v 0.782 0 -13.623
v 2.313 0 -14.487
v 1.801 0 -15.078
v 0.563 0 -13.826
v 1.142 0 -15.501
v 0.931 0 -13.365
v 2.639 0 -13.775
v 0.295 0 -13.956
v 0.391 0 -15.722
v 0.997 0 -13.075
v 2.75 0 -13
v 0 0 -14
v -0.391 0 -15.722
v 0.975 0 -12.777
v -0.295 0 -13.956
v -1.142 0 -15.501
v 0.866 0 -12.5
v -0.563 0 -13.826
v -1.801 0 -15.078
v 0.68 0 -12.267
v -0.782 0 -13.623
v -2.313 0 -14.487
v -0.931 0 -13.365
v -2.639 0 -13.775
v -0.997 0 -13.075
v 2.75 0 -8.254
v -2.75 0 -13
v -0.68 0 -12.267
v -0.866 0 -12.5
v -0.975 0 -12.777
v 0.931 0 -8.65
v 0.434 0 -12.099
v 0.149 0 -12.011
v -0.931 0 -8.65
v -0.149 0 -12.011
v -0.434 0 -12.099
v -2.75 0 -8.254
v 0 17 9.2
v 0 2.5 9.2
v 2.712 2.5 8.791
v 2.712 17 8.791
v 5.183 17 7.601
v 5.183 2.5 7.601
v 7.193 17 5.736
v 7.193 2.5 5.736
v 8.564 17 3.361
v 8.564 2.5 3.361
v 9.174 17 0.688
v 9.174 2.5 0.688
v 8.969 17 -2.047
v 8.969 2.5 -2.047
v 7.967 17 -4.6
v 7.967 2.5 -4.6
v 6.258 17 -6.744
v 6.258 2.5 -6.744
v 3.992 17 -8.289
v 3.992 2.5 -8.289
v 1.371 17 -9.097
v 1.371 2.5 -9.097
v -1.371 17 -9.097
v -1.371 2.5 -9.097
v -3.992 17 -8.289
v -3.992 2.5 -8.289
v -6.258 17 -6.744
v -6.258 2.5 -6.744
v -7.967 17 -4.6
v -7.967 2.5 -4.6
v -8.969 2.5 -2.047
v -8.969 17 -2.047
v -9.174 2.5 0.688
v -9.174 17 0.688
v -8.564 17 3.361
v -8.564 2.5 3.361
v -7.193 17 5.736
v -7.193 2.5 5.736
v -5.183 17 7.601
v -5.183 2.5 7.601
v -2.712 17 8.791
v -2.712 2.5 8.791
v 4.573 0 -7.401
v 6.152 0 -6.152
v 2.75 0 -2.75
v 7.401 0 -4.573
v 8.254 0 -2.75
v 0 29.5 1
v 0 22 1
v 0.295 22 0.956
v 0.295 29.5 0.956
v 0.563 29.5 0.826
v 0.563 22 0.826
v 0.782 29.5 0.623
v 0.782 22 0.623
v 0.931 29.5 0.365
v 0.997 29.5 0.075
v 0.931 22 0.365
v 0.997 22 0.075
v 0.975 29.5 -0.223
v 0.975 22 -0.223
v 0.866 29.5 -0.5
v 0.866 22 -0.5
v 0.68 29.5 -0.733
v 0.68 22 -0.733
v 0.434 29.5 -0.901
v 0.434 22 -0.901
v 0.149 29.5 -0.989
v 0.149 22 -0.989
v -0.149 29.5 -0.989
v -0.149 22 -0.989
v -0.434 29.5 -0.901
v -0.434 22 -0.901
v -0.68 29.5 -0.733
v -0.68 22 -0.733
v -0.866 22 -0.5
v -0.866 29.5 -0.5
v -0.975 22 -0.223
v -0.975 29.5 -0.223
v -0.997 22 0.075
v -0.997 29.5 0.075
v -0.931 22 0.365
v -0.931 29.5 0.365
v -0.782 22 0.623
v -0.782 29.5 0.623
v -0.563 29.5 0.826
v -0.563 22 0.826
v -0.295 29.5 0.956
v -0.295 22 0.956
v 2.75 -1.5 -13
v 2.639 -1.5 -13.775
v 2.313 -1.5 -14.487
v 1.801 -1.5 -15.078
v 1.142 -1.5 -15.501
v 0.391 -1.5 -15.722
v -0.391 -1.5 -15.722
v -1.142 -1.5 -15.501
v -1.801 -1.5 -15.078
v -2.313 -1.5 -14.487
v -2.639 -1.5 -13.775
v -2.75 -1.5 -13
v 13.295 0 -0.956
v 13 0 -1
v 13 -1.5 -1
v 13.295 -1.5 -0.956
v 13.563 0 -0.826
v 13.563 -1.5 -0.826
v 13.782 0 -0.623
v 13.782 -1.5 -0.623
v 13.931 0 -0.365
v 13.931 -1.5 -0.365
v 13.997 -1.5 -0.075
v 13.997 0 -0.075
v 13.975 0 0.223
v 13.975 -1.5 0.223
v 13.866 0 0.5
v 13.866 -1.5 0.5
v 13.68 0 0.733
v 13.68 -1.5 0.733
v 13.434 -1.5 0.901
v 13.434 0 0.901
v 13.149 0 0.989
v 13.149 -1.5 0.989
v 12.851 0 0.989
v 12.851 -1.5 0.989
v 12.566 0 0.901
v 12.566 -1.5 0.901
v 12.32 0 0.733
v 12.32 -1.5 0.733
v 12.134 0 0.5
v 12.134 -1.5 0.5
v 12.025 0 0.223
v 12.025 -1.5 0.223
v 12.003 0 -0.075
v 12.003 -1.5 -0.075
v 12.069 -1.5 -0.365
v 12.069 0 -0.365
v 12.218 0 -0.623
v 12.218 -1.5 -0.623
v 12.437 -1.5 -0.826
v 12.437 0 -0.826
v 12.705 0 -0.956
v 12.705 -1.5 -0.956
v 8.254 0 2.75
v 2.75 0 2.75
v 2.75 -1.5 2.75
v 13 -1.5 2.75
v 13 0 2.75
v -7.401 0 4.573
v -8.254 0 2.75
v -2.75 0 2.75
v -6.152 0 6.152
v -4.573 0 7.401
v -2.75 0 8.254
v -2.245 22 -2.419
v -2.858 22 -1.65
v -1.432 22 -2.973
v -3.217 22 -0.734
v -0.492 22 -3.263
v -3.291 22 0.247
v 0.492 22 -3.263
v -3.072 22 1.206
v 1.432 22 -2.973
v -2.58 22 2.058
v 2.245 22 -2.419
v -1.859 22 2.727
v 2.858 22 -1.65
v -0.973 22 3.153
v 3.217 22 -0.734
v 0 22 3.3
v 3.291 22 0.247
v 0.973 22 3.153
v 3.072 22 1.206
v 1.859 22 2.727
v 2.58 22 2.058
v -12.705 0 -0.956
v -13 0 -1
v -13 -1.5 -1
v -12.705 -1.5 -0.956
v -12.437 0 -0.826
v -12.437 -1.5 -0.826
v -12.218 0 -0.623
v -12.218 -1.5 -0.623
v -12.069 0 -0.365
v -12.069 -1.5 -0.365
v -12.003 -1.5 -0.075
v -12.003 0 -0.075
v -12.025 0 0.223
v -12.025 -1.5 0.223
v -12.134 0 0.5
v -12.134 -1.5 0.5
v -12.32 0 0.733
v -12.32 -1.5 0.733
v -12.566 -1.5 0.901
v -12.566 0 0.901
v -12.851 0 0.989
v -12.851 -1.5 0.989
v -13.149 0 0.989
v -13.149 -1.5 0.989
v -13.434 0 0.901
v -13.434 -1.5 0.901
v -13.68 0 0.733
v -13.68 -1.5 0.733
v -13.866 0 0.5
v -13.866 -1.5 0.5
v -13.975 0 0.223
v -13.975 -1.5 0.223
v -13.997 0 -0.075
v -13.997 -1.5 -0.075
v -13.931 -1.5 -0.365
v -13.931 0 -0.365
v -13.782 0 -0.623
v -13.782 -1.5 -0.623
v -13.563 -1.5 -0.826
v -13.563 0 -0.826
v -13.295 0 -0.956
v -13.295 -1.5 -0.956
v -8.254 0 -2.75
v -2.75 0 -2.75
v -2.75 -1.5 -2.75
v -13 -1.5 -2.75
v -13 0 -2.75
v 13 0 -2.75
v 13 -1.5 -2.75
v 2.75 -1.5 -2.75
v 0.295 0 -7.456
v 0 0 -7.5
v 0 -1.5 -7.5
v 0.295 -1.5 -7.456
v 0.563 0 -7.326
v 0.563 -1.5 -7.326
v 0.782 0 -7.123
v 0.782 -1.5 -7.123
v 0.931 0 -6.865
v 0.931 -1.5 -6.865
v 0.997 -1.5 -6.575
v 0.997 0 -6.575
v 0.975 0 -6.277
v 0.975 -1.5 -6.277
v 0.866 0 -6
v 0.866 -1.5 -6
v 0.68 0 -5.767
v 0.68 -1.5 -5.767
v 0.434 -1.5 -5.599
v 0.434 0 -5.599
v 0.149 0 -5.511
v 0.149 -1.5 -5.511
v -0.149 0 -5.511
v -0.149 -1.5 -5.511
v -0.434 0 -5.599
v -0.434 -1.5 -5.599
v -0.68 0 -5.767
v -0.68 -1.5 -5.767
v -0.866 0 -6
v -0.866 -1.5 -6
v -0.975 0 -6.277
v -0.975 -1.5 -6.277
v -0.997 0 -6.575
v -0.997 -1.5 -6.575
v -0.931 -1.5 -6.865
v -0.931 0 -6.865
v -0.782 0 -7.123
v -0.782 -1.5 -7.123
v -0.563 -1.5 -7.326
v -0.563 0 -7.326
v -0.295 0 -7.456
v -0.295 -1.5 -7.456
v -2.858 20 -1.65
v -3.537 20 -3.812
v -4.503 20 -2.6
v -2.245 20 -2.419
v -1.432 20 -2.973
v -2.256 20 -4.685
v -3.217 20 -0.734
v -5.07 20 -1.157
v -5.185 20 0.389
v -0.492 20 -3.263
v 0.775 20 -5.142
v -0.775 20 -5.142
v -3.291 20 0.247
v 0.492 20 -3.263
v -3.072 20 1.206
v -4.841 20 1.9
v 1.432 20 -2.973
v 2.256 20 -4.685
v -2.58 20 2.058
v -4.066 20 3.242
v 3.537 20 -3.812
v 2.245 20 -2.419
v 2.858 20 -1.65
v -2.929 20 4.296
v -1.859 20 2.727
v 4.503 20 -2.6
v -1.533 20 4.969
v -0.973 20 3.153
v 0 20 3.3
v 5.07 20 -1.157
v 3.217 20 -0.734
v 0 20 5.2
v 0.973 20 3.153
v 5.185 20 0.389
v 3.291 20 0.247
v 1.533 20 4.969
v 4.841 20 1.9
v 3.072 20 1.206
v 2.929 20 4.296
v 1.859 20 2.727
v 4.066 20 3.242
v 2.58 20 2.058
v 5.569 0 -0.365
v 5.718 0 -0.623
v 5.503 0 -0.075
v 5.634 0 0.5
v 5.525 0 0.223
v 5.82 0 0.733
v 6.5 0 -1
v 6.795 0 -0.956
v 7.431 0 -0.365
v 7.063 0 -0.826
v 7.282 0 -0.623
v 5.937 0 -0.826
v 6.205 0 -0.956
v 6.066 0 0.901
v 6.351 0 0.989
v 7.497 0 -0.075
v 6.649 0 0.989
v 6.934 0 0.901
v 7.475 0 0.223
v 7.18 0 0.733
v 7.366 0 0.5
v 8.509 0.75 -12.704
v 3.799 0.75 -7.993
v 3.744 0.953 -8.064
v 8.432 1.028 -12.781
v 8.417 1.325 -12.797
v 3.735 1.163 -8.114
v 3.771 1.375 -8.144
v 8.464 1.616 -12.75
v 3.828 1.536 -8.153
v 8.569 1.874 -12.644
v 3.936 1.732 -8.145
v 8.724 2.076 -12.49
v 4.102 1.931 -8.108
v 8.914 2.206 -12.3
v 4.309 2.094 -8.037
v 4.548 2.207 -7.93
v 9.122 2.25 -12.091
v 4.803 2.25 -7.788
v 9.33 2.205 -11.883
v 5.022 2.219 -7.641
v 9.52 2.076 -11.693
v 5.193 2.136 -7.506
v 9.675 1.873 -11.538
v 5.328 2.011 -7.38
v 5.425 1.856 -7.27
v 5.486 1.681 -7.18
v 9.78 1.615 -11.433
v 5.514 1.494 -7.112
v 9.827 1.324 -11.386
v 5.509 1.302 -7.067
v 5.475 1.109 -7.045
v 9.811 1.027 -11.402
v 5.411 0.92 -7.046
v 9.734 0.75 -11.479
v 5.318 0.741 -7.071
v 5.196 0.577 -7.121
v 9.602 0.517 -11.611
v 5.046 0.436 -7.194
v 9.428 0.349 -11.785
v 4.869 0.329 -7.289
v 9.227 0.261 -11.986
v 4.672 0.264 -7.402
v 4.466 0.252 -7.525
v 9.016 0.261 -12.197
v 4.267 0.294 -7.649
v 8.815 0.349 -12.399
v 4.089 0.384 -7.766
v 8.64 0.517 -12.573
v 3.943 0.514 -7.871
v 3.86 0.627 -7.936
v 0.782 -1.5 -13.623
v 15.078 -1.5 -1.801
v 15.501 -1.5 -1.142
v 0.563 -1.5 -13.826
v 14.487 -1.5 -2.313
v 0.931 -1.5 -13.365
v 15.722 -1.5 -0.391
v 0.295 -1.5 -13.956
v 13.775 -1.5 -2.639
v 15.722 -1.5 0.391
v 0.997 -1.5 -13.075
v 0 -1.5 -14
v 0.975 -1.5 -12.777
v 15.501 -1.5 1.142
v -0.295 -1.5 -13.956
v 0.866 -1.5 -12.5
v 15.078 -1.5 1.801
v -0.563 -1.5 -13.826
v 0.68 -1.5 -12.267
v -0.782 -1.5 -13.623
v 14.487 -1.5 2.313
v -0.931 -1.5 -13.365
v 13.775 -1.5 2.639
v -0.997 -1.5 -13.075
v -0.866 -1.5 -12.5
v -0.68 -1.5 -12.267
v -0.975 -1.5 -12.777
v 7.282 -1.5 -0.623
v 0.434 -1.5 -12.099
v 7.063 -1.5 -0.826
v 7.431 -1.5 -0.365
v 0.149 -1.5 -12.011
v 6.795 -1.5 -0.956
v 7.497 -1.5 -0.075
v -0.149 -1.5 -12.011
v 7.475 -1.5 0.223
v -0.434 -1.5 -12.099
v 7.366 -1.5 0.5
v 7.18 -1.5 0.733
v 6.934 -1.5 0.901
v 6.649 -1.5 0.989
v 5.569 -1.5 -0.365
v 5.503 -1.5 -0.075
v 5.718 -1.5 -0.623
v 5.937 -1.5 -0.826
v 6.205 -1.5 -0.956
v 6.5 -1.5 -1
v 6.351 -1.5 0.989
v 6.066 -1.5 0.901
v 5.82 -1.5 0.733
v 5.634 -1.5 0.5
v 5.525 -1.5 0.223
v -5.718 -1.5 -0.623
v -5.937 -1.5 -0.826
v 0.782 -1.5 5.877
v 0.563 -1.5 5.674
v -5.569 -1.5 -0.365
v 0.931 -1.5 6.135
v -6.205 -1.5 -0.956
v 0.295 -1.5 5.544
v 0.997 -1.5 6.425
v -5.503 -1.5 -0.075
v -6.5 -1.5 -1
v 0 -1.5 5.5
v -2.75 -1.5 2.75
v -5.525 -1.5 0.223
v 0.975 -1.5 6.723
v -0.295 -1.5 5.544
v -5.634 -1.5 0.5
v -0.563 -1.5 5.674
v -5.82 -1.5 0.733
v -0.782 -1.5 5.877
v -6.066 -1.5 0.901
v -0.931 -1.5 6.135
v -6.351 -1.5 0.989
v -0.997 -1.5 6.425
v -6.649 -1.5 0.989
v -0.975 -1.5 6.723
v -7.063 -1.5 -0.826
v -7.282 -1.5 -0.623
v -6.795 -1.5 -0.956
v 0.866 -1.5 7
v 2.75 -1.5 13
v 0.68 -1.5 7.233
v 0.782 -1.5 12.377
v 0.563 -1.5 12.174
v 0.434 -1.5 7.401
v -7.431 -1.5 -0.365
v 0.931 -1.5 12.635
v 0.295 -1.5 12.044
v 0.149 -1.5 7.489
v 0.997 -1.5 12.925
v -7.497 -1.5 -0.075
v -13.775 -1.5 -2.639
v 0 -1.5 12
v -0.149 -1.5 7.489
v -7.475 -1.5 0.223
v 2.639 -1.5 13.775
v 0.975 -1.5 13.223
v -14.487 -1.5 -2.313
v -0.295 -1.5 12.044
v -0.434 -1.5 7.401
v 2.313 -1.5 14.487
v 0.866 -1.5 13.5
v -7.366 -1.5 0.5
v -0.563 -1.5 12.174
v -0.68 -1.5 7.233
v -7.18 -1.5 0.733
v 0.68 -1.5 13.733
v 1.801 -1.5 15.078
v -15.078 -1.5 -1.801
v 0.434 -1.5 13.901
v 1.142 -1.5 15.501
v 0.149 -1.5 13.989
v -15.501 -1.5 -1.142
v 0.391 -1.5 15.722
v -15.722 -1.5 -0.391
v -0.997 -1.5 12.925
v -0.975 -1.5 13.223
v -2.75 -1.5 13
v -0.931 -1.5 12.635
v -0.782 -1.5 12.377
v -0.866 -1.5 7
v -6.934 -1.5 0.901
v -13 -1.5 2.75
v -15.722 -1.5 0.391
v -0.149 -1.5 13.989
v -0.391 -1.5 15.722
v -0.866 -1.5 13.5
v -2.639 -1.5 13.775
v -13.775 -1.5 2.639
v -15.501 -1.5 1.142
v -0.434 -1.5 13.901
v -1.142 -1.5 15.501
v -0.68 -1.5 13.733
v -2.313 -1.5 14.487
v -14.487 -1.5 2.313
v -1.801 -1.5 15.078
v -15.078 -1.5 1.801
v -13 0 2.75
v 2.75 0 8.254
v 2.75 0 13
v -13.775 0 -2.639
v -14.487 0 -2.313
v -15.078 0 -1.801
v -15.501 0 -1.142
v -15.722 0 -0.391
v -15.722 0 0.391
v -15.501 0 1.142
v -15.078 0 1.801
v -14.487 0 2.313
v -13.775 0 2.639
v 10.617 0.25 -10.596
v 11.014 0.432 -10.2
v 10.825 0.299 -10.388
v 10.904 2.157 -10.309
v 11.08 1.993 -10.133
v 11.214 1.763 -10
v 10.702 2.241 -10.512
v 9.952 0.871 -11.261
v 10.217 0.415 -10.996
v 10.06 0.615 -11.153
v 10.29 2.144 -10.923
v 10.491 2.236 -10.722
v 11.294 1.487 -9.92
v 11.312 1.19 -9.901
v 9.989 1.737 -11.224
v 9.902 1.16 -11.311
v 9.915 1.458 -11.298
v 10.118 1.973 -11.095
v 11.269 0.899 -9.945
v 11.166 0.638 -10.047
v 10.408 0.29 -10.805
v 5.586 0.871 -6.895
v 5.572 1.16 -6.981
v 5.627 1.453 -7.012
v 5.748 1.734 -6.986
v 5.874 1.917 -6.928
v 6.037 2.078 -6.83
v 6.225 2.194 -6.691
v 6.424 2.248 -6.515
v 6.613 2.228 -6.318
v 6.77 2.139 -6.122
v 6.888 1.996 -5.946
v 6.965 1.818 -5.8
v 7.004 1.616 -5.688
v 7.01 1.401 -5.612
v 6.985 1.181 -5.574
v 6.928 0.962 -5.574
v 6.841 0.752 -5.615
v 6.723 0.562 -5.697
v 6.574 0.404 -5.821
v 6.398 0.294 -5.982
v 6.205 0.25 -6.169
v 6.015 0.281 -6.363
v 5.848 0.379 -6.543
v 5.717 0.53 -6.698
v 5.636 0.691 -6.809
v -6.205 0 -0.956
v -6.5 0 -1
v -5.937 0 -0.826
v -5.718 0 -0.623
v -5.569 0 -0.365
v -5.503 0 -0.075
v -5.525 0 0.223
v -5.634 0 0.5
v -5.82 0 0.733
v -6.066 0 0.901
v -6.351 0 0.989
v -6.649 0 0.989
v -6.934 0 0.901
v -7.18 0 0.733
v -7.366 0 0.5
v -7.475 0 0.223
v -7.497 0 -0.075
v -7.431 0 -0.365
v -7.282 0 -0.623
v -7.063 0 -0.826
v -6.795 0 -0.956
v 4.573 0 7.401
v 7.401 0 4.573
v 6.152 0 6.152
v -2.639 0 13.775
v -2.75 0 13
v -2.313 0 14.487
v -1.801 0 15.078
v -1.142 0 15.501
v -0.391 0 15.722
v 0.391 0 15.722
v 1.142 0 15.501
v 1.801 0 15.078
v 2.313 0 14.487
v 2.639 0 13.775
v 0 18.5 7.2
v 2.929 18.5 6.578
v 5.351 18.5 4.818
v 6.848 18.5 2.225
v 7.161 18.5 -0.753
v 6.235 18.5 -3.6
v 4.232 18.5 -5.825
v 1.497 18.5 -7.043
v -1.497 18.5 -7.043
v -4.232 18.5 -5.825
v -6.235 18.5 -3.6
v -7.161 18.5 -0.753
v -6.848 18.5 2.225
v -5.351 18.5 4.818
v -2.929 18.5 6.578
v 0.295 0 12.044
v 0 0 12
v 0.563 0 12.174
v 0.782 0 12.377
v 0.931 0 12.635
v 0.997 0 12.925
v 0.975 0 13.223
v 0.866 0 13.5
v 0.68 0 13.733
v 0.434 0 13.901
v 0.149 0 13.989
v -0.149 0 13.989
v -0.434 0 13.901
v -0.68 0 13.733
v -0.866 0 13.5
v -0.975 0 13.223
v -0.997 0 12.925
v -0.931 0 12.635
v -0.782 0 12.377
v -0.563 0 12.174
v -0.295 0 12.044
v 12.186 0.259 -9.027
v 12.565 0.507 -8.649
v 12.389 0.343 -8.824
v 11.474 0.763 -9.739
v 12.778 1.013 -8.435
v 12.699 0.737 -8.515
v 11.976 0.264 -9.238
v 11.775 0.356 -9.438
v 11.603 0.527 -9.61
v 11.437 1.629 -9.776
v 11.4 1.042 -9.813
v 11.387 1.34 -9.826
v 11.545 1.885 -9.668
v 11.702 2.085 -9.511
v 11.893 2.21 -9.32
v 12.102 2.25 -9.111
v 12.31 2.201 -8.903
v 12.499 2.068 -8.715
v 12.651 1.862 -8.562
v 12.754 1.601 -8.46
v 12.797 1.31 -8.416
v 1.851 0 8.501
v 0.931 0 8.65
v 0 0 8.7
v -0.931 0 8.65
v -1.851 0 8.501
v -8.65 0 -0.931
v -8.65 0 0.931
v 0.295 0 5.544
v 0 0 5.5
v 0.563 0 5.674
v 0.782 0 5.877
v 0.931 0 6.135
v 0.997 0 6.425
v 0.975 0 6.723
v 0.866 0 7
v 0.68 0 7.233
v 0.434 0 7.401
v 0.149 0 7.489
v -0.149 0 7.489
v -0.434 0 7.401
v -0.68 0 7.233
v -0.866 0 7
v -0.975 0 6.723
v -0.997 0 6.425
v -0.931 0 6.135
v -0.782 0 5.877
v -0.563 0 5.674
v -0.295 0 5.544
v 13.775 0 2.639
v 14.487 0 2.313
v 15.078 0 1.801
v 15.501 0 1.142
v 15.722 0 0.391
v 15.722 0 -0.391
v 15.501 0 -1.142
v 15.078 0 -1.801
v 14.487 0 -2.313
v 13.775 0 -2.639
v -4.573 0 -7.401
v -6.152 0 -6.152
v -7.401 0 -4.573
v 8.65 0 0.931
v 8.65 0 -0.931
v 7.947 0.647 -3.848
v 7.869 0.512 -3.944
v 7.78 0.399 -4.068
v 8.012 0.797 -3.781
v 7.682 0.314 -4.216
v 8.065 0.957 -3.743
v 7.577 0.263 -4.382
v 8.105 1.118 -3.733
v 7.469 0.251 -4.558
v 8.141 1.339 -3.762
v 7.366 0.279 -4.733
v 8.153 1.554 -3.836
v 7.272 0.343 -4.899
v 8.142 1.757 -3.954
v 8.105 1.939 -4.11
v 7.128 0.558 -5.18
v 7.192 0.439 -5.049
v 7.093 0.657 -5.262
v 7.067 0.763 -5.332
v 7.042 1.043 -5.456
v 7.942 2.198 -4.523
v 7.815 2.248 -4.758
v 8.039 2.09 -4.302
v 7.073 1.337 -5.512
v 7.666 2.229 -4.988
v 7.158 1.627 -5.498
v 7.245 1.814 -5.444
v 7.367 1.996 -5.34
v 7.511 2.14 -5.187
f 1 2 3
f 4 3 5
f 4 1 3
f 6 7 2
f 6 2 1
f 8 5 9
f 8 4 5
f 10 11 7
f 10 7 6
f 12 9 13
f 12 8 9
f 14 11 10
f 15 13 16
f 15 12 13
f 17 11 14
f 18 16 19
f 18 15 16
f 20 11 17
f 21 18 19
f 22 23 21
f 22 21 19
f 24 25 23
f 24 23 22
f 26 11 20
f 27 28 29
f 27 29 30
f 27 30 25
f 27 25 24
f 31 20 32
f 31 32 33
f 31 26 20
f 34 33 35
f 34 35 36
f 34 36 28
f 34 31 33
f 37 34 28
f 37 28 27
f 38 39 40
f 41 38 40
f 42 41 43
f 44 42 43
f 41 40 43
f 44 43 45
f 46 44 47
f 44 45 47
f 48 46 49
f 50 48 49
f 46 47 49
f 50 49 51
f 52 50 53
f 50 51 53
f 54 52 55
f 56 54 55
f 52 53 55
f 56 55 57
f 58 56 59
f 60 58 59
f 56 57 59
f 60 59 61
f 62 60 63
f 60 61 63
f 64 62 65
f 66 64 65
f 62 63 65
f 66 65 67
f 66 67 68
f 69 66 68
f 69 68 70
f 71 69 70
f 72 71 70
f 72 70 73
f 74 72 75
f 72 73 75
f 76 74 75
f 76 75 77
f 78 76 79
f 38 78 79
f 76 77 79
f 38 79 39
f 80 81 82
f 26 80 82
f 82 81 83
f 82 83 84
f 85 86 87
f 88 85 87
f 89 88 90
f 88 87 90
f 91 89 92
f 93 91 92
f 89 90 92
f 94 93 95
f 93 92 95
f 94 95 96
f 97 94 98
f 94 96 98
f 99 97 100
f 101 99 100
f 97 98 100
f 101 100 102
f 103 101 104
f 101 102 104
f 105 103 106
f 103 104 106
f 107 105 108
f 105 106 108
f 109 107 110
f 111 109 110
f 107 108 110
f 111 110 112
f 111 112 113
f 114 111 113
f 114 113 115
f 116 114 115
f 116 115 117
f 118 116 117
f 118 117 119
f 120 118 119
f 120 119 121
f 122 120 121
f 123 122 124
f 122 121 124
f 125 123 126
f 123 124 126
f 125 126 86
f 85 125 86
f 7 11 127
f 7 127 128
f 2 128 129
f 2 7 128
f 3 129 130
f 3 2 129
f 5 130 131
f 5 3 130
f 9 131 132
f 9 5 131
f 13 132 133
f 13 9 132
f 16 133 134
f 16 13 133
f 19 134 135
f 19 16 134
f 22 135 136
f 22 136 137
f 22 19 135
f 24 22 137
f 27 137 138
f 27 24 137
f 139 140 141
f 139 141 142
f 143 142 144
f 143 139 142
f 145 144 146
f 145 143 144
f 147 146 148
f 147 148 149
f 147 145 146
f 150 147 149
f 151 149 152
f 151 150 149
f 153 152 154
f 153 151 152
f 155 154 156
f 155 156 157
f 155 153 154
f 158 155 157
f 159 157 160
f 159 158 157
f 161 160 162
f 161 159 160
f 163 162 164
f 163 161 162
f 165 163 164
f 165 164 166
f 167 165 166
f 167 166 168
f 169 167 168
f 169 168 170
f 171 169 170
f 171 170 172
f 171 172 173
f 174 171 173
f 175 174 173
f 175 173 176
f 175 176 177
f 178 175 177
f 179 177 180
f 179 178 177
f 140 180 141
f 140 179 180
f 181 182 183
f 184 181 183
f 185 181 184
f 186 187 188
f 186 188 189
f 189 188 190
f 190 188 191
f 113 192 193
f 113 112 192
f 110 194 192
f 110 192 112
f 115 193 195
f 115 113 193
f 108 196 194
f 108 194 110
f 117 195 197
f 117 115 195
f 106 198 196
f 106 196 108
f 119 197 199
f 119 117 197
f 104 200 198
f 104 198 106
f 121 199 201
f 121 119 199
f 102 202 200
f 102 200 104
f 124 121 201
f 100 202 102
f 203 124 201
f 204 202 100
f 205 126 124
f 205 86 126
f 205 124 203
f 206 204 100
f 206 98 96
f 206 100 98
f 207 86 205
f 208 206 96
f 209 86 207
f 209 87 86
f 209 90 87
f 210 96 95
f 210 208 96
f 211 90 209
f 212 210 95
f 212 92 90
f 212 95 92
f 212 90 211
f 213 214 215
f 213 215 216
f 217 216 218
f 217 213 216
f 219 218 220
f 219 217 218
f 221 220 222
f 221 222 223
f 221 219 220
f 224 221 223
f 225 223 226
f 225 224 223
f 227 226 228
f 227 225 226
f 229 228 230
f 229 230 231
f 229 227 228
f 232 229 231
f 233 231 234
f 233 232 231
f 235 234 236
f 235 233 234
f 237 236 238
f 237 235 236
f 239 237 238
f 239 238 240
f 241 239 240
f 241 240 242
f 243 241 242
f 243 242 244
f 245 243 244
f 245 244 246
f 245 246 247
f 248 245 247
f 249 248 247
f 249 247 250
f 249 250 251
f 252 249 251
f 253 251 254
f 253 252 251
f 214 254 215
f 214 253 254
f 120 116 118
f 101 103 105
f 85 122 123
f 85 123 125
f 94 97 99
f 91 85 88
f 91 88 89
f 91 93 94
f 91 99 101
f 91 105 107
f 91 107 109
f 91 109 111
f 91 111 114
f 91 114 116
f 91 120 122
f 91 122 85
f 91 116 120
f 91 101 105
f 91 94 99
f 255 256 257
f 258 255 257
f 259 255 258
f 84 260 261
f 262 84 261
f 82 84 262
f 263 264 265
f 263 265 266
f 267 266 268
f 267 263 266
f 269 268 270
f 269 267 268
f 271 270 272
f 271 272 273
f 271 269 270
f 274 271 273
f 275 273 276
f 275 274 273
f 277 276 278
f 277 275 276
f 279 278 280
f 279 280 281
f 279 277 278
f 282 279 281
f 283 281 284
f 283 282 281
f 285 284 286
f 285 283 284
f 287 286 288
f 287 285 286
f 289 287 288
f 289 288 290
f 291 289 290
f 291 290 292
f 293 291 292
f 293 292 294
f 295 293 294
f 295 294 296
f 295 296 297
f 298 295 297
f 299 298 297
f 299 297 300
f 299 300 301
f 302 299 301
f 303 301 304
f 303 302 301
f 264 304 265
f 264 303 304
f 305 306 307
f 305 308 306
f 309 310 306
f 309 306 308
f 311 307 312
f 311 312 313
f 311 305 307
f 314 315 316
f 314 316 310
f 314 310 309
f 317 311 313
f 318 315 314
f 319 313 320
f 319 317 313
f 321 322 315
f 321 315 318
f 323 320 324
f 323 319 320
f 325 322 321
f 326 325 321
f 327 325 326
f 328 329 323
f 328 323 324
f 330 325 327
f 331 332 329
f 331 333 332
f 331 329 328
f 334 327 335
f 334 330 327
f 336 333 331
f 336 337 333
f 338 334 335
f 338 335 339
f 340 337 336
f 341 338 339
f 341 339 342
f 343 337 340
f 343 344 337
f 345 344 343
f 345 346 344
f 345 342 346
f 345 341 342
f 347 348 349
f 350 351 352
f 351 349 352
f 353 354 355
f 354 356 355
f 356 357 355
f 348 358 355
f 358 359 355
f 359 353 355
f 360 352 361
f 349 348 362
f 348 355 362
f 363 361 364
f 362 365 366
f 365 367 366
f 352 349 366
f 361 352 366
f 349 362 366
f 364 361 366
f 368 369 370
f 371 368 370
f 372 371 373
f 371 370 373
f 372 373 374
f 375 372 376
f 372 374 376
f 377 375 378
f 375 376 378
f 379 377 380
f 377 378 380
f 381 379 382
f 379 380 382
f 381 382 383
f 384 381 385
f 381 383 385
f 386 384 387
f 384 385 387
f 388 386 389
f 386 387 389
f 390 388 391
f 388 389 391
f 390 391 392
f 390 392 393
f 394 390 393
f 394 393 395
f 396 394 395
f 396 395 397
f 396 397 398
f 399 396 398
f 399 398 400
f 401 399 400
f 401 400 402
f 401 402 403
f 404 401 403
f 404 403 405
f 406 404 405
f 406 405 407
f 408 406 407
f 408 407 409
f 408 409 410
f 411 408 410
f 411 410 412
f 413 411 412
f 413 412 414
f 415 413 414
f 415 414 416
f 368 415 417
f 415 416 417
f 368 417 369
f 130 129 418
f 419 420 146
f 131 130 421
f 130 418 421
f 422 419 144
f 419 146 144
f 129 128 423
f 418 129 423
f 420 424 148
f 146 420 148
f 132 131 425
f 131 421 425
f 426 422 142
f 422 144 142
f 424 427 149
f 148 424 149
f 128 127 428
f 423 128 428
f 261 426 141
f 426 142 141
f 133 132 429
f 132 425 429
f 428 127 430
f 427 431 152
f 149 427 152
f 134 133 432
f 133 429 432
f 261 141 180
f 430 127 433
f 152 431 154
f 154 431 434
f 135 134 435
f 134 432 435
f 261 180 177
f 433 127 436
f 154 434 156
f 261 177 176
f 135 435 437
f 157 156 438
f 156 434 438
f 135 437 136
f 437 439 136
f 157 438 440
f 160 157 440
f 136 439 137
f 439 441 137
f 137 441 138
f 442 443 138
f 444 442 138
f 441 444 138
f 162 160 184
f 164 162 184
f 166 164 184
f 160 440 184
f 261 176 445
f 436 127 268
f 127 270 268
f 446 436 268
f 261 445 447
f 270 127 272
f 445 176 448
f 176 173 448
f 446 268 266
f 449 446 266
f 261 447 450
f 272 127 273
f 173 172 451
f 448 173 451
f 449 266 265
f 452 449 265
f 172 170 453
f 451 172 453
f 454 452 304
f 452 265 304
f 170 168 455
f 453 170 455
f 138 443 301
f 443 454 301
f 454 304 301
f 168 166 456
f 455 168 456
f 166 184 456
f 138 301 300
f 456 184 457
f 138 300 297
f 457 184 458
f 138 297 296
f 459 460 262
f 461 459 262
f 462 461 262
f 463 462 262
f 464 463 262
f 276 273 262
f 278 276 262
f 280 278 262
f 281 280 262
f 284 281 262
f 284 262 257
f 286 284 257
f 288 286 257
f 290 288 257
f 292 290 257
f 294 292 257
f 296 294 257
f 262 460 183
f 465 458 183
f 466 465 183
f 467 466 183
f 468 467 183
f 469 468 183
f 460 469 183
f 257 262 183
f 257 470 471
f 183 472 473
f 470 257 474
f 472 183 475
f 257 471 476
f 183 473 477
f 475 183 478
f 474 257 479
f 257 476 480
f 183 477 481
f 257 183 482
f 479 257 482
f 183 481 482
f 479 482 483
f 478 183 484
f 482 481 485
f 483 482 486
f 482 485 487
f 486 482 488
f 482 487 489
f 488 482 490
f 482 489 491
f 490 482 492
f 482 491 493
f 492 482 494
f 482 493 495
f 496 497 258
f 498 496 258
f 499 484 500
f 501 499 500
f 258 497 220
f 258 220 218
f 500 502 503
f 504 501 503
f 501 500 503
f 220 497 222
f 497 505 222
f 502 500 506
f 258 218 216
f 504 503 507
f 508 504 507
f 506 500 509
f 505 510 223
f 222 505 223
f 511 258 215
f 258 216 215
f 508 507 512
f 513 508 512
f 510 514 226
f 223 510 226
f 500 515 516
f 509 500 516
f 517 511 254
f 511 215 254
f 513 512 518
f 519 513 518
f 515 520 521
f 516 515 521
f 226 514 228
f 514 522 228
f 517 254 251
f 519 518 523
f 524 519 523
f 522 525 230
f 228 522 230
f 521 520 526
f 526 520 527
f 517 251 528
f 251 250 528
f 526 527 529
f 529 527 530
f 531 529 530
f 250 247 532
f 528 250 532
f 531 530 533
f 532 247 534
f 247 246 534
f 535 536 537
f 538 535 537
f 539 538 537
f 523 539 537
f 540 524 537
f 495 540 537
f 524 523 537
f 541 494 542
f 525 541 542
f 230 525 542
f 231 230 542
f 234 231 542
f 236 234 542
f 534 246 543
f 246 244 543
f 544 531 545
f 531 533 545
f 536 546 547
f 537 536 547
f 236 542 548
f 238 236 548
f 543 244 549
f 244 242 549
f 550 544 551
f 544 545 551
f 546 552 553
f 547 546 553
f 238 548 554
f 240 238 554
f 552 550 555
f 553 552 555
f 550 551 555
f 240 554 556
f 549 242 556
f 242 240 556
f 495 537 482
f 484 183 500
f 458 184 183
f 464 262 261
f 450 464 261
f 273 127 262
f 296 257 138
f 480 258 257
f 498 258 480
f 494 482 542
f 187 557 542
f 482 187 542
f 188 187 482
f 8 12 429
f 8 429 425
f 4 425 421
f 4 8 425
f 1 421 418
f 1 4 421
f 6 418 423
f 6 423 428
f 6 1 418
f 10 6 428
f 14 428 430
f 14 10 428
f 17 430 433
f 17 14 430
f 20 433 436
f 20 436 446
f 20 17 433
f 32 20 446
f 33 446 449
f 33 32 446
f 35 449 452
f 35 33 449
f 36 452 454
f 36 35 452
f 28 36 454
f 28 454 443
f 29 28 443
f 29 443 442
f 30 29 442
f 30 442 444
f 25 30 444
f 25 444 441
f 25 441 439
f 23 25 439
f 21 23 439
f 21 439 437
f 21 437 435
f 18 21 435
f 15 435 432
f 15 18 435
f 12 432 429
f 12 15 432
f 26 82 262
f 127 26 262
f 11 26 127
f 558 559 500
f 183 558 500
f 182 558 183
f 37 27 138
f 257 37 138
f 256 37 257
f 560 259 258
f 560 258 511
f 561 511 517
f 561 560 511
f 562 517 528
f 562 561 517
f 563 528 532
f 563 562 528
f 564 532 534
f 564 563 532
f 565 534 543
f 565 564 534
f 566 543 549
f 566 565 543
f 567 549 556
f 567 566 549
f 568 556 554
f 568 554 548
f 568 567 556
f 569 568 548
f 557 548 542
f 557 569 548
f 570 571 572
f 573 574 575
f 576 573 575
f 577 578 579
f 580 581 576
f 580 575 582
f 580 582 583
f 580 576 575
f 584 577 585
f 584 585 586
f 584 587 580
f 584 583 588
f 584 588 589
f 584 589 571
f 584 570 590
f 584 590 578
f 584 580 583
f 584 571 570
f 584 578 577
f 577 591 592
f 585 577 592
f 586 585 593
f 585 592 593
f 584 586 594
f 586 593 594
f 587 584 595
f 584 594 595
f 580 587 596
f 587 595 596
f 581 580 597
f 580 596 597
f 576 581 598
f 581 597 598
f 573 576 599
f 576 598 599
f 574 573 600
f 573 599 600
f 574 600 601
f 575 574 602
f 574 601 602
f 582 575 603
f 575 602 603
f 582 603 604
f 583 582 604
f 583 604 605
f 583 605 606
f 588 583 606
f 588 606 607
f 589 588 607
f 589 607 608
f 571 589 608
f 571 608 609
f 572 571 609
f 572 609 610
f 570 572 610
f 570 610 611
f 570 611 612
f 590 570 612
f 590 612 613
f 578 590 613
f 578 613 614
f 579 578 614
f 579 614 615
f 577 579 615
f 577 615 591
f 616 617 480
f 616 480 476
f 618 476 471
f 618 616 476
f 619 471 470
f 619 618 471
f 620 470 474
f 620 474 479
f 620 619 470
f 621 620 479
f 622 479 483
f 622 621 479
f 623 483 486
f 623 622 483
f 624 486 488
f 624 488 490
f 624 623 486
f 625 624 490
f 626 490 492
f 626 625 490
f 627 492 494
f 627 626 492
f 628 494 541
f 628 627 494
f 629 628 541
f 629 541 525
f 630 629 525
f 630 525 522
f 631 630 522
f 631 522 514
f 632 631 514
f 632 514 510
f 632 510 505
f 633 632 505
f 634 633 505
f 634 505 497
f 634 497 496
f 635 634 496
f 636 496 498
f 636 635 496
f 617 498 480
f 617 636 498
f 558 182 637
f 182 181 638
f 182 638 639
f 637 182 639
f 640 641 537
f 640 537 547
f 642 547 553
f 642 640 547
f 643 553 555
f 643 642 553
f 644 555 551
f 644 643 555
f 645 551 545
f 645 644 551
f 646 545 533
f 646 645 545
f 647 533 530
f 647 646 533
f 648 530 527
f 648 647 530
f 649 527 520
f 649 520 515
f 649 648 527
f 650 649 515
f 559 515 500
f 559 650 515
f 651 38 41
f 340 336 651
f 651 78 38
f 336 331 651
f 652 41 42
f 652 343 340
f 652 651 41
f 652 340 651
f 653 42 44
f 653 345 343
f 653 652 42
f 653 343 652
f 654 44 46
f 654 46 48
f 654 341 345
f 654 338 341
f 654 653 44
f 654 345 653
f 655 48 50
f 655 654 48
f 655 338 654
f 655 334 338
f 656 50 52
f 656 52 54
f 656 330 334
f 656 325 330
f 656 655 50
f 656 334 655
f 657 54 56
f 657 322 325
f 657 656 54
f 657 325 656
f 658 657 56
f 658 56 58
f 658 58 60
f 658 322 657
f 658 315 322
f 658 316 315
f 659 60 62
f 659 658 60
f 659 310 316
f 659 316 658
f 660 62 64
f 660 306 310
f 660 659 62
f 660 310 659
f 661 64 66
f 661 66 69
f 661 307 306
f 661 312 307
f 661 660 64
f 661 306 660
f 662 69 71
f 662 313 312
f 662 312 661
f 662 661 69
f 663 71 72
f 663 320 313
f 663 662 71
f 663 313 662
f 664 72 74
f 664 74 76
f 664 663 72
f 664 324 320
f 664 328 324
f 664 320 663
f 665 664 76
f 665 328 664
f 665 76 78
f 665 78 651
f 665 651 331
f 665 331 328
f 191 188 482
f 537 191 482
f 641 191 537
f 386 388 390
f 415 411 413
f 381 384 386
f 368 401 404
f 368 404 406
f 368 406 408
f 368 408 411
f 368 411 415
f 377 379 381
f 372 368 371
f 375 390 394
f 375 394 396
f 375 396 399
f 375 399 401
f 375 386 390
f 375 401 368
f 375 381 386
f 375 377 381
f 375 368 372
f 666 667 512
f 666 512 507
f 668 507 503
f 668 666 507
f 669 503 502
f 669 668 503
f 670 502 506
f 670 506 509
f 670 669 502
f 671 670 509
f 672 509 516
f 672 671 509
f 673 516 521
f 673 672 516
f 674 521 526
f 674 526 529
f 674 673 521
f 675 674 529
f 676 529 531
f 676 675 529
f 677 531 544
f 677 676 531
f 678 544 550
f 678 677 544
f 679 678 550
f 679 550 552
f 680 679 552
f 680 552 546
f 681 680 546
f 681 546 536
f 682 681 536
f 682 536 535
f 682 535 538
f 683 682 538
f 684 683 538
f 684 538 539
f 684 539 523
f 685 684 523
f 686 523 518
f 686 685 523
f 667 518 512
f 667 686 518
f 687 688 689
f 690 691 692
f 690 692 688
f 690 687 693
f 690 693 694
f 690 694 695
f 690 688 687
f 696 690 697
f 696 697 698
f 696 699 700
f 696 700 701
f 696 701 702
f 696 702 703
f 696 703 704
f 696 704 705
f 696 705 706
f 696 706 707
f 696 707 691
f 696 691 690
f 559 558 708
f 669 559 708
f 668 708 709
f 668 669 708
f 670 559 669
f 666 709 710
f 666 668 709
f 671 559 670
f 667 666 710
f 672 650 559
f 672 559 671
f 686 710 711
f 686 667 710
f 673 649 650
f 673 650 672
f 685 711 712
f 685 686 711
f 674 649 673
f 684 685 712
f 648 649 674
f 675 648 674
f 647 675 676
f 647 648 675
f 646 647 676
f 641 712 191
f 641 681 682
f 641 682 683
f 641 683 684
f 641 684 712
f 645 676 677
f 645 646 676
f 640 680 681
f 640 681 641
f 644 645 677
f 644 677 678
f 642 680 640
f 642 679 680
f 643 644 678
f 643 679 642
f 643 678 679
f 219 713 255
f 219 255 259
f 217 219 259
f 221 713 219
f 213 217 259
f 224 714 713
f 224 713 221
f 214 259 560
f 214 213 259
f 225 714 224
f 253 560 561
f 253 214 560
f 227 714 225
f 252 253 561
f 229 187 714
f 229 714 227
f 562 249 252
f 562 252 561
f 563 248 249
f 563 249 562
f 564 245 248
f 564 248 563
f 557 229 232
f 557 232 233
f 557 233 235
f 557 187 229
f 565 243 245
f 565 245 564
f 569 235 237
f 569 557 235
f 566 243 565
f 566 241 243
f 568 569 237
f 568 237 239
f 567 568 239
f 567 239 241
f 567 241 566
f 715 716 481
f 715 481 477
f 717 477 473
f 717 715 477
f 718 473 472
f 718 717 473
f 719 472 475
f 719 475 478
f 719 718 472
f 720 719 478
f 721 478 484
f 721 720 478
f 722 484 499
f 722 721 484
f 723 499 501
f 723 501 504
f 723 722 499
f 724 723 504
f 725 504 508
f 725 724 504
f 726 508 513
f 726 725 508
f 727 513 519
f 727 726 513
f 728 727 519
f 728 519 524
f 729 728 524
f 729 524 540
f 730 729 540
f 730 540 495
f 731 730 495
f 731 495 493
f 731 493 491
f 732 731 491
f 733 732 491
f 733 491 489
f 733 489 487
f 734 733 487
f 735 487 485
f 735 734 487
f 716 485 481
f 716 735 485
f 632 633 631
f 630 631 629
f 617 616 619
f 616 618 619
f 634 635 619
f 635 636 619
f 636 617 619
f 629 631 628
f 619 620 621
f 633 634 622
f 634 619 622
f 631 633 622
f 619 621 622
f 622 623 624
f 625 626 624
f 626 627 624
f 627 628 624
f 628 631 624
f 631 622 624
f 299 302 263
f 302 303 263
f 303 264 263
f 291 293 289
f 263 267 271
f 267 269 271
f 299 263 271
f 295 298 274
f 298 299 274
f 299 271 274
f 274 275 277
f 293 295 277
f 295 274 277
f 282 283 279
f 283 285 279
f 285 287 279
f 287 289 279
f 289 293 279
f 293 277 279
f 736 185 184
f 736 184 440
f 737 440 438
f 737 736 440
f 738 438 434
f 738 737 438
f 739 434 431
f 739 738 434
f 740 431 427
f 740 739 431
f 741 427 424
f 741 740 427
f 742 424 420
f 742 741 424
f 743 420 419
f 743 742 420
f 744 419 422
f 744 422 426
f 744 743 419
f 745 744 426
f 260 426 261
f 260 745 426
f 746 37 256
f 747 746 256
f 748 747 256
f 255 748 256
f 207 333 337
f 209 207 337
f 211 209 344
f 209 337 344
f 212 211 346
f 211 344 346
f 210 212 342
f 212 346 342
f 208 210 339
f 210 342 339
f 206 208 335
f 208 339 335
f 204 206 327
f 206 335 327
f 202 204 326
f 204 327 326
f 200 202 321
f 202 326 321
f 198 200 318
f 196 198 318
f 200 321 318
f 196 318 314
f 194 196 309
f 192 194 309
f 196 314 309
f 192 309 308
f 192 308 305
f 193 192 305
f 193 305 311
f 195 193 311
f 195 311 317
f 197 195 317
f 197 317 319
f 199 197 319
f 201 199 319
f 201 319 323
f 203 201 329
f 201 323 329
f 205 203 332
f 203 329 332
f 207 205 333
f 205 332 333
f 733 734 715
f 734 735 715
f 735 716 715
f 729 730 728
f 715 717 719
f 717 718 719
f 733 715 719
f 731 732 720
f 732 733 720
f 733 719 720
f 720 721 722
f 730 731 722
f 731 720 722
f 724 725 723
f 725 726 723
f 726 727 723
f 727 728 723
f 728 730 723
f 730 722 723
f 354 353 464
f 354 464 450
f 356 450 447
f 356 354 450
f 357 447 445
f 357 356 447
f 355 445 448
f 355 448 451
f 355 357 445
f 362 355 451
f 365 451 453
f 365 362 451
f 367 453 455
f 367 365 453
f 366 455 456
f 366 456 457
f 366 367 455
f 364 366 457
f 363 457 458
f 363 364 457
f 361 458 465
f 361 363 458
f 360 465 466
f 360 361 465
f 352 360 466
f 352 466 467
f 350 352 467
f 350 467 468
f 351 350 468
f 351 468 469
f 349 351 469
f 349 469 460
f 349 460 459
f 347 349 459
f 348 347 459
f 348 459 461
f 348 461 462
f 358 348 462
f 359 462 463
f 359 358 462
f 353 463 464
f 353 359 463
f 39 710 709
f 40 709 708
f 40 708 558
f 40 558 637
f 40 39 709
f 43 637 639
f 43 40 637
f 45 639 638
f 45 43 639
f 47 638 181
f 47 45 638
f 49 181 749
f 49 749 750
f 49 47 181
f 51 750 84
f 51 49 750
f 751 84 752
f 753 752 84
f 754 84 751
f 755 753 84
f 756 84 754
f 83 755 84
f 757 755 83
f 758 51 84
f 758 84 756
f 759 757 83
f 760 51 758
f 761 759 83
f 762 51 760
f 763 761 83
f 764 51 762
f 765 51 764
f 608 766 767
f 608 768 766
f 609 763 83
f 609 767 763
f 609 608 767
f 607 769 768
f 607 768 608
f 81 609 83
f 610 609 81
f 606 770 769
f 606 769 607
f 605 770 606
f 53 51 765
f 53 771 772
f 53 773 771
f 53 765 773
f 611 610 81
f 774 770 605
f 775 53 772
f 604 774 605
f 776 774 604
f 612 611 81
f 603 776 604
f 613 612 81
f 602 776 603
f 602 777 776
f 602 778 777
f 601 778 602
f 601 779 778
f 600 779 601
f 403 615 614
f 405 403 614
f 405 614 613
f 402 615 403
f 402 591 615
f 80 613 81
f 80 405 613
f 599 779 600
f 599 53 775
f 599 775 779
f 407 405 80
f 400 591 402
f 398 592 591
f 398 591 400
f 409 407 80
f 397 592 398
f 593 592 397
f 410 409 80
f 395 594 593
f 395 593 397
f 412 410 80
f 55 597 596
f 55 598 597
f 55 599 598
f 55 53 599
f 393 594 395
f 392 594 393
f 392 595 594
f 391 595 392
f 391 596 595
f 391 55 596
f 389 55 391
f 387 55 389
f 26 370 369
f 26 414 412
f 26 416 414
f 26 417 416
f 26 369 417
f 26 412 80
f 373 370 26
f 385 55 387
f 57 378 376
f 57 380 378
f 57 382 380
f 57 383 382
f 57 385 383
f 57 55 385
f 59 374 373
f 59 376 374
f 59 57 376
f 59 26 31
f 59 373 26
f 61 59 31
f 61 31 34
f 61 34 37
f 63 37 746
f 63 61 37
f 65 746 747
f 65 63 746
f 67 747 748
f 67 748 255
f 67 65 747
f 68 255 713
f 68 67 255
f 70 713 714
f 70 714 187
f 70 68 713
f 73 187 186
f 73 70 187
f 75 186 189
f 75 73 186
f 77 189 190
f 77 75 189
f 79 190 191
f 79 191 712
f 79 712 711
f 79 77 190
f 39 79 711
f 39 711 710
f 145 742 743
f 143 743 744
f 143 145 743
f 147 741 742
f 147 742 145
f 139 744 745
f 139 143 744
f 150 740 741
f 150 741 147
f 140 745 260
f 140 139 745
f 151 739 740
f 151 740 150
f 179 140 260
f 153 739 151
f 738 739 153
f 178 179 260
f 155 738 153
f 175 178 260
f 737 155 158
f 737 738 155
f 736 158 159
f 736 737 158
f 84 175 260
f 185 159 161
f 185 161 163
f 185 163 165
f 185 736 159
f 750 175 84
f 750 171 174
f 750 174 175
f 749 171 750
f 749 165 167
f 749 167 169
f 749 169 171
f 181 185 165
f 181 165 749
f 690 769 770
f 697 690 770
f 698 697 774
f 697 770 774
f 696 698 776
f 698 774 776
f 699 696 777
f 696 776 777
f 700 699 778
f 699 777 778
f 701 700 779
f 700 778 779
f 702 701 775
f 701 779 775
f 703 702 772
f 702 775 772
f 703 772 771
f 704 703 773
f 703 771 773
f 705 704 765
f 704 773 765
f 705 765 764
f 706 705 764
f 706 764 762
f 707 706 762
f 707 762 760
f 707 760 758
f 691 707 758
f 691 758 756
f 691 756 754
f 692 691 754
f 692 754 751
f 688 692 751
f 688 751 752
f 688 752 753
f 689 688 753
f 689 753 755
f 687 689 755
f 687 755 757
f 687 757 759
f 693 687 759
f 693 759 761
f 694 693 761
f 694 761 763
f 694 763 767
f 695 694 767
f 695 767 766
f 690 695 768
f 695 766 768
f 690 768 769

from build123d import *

# Parameters (mm, degrees)
SKETCH1_R           = 9.2
BOSS_EXTRUDE1_DEPTH = 20
CHAMFER1_SIZE       = 3
CHAMFER1_SIZE2      = 4
SKETCH2_R           = 3.3
BOSS_EXTRUDE2_DEPTH = 2
SKETCH3_R           = 1
BOSS_EXTRUDE3_DEPTH = 7.5
CHAMFER2_SIZE       = 0.5
CHAMFER2_SIZE2      = 2.5
SKETCH4_R           = 1
BOSS_EXTRUDE4_DEPTH = 1.5
SKETCH5_R           = 1
BOSS_EXTRUDE5_DEPTH = 15


with BuildPart() as part:
    # Sketch1 → Boss-Extrude1 (new body)
    with BuildSketch(Plane(origin=(0, 0, 0), x_dir=(1, 0, 0), z_dir=(0, 1, 0))):
        with Locations(Location((0, 0, 0), (0, 0, 270))):
            Circle(SKETCH1_R)
    extrude(amount=BOSS_EXTRUDE1_DEPTH)

    # Chamfer1
    chamfer1_edges = [part.edges().sort_by_distance(p)[0] for p in [
        (0, 20, -9.2),
    ]]
    chamfer1_side = [part.faces().sort_by_distance(p)[0] for p in [
        (0, 10, -9.2),
    ]]
    chamfer(chamfer1_edges, length=CHAMFER1_SIZE, length2=CHAMFER1_SIZE2, reference=chamfer1_side[0])

    # Sketch2 → Boss-Extrude2 (add)
    with BuildSketch(Plane(origin=(0, 20, 0), x_dir=(1, 0, 0), z_dir=(0, 1, 0))):
        with Locations(Location((0, 0, 0), (0, 0, 270))):
            Circle(SKETCH2_R)
    extrude(amount=BOSS_EXTRUDE2_DEPTH)

    # Sketch3 → Boss-Extrude3 (add)
    with BuildSketch(Plane(origin=(0, 22, 0), x_dir=(1, 0, 0), z_dir=(0, 1, 0))):
        with Locations(Location((0, 0, 0), (0, 0, 270))):
            Circle(SKETCH3_R)
    extrude(amount=BOSS_EXTRUDE3_DEPTH)

    # Chamfer2
    chamfer2_edges = [part.edges().sort_by_distance(p)[0] for p in [
        (0, 0, -9.2),
    ]]
    chamfer2_side = [part.faces().sort_by_distance(p)[0] for p in [
        (0, 0, 0),
    ]]
    chamfer(chamfer2_edges, length=CHAMFER2_SIZE, length2=CHAMFER2_SIZE2, reference=chamfer2_side[0])

    # Sketch4 → Boss-Extrude4 (add)
    with BuildSketch(Plane.XZ):
        with BuildLine():
            Line((-2.75, 2.75), (-2.75, 13))
            ThreePointArc((-2.75, 13), (0, 15.75), (2.75, 13))
            Line((2.75, 13), (2.75, 2.75))
            Line((2.75, 2.75), (13, 2.75))
            ThreePointArc((13, 2.75), (15.75, 0), (13, -2.75))
            Line((13, -2.75), (2.75, -2.75))
            Line((2.75, -2.75), (2.75, -13))
            ThreePointArc((2.75, -13), (0, -15.75), (-2.75, -13))
            Line((-2.75, -13), (-2.75, -2.75))
            Line((-2.75, -2.75), (-13, -2.75))
            ThreePointArc((-13, -2.75), (-15.75, 0), (-13, 2.75))
            Line((-13, 2.75), (-2.75, 2.75))
        make_face()
        with Locations(Location((0, 13, 0), (0, 0, 270))):
            Circle(SKETCH4_R, mode=Mode.SUBTRACT)
        with Locations(Location((13, 0, 0), (0, 0, 270))):
            Circle(SKETCH4_R, mode=Mode.SUBTRACT)
        with Locations(Location((0, -13, 0), (0, 0, 270))):
            Circle(SKETCH4_R, mode=Mode.SUBTRACT)
        with Locations(Location((-13, 0, 0), (0, 0, 270))):
            Circle(SKETCH4_R, mode=Mode.SUBTRACT)
        with Locations(Location((0, 6.5, 0), (0, 0, 270))):
            Circle(SKETCH4_R, mode=Mode.SUBTRACT)
        with Locations(Location((6.5, 0, 0), (0, 0, 270))):
            Circle(SKETCH4_R, mode=Mode.SUBTRACT)
        with Locations(Location((0, -6.5, 0), (0, 0, 270))):
            Circle(SKETCH4_R, mode=Mode.SUBTRACT)
        with Locations(Location((-6.5, 0, 0), (0, 0, 270))):
            Circle(SKETCH4_R, mode=Mode.SUBTRACT)
    extrude(amount=BOSS_EXTRUDE4_DEPTH)

    # Sketch5 → Boss-Extrude5 (add)
    with BuildSketch(Plane(origin=(0, 0, 0), x_dir=(-0.7071067811865477, 0, -0.7071067811865475), z_dir=(0.7071067811865475, 0, -0.7071067811865477))):
        with Locations(Location((-2.1, 1.25, 0), (0, 0, 330.861265368))):
            Circle(SKETCH5_R)
        with Locations(Location((0, 1.25, 0), (0, 0, 337.716833598))):
            Circle(SKETCH5_R)
        with Locations(Location((2.1, 1.25, 0), (0, 0, 330.024971027))):
            Circle(SKETCH5_R)
    extrude(amount=BOSS_EXTRUDE5_DEPTH)


solid = part.part
